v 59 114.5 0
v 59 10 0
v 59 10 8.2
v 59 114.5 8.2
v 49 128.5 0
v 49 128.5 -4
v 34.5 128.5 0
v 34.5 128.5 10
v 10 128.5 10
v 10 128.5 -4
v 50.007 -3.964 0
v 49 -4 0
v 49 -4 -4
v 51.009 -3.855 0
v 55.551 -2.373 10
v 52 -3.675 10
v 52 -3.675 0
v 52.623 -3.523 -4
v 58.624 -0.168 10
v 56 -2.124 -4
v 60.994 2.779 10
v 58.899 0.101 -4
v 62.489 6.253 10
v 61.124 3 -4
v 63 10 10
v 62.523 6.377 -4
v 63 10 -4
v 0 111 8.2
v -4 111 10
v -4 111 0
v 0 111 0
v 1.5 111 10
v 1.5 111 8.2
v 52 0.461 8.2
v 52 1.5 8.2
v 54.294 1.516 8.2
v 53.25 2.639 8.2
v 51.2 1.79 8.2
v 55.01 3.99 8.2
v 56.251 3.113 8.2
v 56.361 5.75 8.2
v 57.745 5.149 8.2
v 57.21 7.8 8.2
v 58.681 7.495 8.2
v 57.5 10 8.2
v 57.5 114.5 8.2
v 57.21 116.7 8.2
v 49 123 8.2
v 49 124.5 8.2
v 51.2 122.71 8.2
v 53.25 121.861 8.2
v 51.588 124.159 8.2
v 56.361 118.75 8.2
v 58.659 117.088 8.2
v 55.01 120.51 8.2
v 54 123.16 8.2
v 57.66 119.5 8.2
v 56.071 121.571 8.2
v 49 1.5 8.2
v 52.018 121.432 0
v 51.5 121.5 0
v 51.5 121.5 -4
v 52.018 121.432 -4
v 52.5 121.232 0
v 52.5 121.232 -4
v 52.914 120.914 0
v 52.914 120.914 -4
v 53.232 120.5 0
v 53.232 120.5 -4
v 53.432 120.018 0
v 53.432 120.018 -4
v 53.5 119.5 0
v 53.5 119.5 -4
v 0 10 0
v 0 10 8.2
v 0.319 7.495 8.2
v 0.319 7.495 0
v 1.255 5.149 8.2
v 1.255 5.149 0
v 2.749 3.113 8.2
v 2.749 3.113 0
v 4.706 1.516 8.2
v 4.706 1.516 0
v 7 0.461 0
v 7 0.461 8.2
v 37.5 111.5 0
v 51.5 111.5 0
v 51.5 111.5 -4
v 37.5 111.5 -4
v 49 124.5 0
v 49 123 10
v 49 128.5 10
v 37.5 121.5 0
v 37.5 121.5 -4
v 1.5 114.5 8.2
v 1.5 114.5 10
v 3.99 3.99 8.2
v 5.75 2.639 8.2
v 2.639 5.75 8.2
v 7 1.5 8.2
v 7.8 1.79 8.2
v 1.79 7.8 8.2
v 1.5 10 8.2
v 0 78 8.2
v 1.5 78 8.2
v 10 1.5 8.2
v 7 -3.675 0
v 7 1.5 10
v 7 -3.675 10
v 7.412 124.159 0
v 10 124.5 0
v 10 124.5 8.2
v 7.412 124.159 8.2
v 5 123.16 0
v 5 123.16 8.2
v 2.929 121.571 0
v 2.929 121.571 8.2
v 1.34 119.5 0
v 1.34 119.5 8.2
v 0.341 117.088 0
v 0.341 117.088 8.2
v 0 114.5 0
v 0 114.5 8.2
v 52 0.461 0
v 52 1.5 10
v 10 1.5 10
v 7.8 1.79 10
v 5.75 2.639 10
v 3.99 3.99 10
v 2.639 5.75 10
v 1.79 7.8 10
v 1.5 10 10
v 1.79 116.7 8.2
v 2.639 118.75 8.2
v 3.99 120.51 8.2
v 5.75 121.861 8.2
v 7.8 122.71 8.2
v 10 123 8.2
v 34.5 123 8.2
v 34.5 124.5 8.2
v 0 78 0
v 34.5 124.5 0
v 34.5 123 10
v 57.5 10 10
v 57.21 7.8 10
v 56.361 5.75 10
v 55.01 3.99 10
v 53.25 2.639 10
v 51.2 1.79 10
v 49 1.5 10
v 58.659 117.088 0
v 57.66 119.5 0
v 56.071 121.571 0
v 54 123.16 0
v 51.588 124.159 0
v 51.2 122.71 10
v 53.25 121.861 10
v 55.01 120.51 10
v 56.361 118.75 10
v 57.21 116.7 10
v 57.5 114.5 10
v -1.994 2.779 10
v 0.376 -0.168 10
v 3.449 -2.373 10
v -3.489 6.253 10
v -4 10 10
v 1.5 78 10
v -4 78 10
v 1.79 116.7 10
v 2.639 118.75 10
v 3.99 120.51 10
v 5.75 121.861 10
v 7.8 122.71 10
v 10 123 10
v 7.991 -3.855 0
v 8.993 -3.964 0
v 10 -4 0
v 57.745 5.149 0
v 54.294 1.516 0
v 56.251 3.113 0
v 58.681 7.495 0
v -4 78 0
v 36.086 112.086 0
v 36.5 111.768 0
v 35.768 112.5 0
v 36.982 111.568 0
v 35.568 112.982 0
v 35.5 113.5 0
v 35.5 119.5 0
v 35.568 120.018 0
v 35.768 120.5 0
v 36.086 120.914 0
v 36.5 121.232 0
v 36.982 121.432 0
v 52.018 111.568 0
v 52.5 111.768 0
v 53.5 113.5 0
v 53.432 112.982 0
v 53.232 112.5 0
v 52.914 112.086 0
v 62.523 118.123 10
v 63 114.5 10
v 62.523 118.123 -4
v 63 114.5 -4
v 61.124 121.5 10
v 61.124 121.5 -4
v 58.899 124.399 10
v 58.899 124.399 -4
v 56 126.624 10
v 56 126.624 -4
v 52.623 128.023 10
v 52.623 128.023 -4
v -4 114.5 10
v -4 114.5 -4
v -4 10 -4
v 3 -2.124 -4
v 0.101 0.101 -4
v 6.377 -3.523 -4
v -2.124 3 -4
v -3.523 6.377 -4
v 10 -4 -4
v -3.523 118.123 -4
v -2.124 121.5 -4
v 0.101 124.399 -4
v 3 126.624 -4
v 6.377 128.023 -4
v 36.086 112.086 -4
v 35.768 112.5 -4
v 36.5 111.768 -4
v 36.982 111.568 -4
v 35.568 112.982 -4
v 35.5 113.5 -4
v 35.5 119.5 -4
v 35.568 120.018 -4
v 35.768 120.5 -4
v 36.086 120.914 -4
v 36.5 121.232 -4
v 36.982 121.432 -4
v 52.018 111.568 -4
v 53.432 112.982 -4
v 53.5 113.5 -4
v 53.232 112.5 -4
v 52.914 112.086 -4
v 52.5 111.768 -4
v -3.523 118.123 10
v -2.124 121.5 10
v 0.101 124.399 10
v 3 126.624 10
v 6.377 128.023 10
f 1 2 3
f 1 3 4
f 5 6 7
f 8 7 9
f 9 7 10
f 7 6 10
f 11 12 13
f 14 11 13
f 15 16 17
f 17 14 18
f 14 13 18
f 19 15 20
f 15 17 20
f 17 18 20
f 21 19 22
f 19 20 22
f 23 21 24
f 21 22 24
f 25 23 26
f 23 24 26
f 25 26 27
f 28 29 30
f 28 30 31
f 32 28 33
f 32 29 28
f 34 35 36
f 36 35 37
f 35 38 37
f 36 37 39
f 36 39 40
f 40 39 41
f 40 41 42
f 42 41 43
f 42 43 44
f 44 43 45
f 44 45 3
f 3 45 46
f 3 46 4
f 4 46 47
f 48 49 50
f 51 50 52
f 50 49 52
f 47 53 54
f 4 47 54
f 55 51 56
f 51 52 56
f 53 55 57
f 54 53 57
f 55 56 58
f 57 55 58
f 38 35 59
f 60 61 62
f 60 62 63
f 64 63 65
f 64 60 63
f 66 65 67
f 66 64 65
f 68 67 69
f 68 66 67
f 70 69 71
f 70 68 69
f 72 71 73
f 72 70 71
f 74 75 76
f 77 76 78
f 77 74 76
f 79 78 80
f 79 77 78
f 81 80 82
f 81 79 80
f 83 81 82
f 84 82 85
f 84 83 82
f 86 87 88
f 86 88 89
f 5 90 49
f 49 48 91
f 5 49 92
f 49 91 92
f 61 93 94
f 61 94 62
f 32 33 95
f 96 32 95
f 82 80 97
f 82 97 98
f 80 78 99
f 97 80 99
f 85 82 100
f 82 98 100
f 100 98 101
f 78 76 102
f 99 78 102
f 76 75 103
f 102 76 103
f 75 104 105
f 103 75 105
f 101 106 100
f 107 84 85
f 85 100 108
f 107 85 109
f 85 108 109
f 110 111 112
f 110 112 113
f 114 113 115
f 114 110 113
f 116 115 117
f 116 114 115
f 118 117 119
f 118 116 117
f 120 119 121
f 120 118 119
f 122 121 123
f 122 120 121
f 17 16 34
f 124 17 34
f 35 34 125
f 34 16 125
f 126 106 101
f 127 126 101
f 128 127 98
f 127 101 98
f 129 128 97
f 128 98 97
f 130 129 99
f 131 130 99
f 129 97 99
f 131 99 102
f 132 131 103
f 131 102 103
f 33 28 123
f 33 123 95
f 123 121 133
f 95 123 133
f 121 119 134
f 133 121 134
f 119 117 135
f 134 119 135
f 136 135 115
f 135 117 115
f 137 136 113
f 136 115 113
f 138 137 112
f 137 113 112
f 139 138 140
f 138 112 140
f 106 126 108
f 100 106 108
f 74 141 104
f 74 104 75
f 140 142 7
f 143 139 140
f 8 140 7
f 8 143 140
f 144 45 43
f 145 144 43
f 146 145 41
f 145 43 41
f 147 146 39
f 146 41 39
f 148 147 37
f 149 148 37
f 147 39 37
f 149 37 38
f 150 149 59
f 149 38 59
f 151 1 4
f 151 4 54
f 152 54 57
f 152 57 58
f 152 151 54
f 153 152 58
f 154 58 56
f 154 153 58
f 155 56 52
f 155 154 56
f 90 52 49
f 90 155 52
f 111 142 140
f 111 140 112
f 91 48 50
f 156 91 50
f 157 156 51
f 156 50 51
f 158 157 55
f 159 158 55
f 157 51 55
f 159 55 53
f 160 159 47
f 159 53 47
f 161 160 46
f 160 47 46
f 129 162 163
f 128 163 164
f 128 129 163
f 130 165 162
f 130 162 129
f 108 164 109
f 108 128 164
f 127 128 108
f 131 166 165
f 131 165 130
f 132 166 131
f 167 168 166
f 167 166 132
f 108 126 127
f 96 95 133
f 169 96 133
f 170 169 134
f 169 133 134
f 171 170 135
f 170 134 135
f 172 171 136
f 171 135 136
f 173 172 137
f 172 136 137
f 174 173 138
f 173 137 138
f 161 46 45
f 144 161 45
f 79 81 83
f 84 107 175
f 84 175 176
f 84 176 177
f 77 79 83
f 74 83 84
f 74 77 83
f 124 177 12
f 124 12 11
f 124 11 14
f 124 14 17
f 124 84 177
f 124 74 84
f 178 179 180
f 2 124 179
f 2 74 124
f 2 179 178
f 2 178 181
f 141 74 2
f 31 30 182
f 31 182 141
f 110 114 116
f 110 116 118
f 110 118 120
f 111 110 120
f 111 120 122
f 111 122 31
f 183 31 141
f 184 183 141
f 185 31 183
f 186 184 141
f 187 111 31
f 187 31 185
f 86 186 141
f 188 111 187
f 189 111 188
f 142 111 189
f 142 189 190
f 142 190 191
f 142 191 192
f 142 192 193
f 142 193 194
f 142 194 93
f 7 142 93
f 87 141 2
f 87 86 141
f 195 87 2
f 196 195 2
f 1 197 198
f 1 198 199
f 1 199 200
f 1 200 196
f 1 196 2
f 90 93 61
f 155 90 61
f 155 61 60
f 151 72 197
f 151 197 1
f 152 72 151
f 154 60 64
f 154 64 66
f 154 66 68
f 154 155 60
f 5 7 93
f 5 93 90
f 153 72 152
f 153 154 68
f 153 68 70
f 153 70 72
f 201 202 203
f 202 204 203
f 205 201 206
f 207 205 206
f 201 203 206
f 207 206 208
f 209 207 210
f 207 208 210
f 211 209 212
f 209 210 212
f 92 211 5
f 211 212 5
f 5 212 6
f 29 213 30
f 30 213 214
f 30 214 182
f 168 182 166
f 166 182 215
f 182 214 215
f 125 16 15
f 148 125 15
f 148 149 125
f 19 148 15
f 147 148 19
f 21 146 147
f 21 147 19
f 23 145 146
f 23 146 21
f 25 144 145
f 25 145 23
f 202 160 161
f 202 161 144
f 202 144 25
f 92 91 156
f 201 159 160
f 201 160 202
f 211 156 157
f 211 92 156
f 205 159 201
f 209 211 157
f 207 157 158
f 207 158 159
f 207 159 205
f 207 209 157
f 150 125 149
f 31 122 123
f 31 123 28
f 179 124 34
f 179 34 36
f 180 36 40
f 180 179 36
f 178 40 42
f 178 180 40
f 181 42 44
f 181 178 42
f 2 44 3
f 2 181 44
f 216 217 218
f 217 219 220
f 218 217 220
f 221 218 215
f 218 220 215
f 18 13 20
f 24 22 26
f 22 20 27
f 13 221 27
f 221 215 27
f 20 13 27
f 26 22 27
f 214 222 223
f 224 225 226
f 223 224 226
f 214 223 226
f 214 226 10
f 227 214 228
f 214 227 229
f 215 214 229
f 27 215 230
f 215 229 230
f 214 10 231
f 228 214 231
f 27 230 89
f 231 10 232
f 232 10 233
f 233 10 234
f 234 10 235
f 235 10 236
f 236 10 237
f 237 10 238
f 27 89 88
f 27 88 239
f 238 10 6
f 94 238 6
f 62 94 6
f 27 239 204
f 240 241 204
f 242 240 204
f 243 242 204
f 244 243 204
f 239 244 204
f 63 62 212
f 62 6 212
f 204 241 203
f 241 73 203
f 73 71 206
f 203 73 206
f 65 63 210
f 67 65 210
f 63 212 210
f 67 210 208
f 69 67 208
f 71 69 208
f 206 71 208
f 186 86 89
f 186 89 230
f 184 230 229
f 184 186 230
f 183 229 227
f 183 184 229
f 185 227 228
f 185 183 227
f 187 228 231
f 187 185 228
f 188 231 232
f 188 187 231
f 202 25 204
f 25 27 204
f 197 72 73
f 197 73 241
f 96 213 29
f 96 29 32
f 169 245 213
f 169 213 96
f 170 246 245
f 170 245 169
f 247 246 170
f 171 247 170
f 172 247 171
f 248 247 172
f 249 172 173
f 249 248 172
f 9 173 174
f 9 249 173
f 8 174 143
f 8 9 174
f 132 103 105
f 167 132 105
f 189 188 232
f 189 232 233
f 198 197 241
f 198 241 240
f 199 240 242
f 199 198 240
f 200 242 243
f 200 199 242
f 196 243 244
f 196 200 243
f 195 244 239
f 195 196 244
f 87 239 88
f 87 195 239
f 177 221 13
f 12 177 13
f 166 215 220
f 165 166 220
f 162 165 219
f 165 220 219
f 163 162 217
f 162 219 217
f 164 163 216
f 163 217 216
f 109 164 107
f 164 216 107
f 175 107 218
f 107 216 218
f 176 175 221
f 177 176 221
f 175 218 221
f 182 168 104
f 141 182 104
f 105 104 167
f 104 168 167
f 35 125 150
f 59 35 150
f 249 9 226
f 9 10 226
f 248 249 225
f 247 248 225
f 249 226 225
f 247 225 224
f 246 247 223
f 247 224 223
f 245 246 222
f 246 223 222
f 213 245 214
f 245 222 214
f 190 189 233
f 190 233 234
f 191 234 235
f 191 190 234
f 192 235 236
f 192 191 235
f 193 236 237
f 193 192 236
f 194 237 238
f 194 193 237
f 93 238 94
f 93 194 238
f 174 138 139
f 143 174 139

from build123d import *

# Parameters (mm, degrees)
F1_DEPTH = 4
F2_DEPTH = 10
F3_DEPTH = 8.2
F4_W     = 5.5
F4_H     = 33
F4_W_2   = 14.5
F4_H_2   = 5.5
F5_DEPTH = 10


with BuildPart() as f1:
    # F0 (on Top) → F1 (new body)
    with BuildSketch(Plane.XY):
        with BuildLine():
            ThreePointArc((49, -4), (58.8994949366, 0.1005050634), (63, 10))
            Line((63, 10), (63, 114.5))
            ThreePointArc((63, 114.5), (58.8994949366, 124.3994949366), (49, 128.5))
            Line((49, 128.5), (10, 128.5))
            ThreePointArc((10, 128.5), (0.1005050634, 124.3994949366), (-4, 114.5))
            Line((-4, 114.5), (-4, 10))
            ThreePointArc((-4, 10), (0.1005050634, 0.1005050634), (10, -4))
            Line((10, -4), (49, -4))
        make_face()
        with BuildLine():
            Line((49, 0), (10, 0))
            ThreePointArc((10, 0), (2.9289321881, 2.9289321881), (0, 10))
            Line((0, 10), (0, 114.5))
            ThreePointArc((0, 114.5), (2.9289321881, 121.5710678119), (10, 124.5))
            Line((10, 124.5), (49, 124.5))
            ThreePointArc((49, 124.5), (56.0710678119, 121.5710678119), (59, 114.5))
            Line((59, 114.5), (59, 10))
            ThreePointArc((59, 10), (56.0710678119, 2.9289321881), (49, 0))
        make_face(mode=Mode.SUBTRACT)
        with BuildLine():
            ThreePointArc((0, 10), (2.9289321881, 2.9289321881), (10, 0))
            Line((10, 0), (49, 0))
            ThreePointArc((49, 0), (56.0710678119, 2.9289321881), (59, 10))
            Line((59, 10), (59, 114.5))
            ThreePointArc((59, 114.5), (56.0710678119, 121.5710678119), (49, 124.5))
            Line((49, 124.5), (10, 124.5))
            ThreePointArc((10, 124.5), (2.9289321881, 121.5710678119), (0, 114.5))
            Line((0, 114.5), (0, 10))
        make_face()
        with BuildLine():
            ThreePointArc((57.5, 10), (55.0104076401, 3.9895923599), (49, 1.5))
            Line((49, 1.5), (10, 1.5))
            ThreePointArc((10, 1.5), (3.9895923599, 3.9895923599), (1.5, 10))
            Line((1.5, 10), (1.5, 114.5))
            ThreePointArc((1.5, 114.5), (3.9895923599, 120.5104076401), (10, 123))
            Line((10, 123), (49, 123))
            ThreePointArc((49, 123), (55.0104076401, 120.5104076401), (57.5, 114.5))
            Line((57.5, 114.5), (57.5, 10))
        make_face(mode=Mode.SUBTRACT)
        with BuildLine():
            Line((10, 1.5), (49, 1.5))
            ThreePointArc((49, 1.5), (55.0104076401, 3.9895923599), (57.5, 10))
            Line((57.5, 10), (57.5, 114.5))
            ThreePointArc((57.5, 114.5), (55.0104076401, 120.5104076401), (49, 123))
            Line((49, 123), (10, 123))
            ThreePointArc((10, 123), (3.9895923599, 120.5104076401), (1.5, 114.5))
            Line((1.5, 114.5), (1.5, 10))
            ThreePointArc((1.5, 10), (3.9895923599, 3.9895923599), (10, 1.5))
        make_face()
        with BuildLine():
            Line((37.5, 121.5), (51.5, 121.5))
            ThreePointArc((51.5, 121.5), (52.9142135624, 120.9142135624), (53.5, 119.5))
            Line((53.5, 119.5), (53.5, 113.5))
            ThreePointArc((53.5, 113.5), (52.9142135624, 112.0857864376), (51.5, 111.5))
            Line((51.5, 111.5), (37.5, 111.5))
            ThreePointArc((37.5, 111.5), (36.0857864376, 112.0857864376), (35.5, 113.5))
            Line((35.5, 113.5), (35.5, 119.5))
            ThreePointArc((35.5, 119.5), (36.0857864376, 120.9142135624), (37.5, 121.5))
        make_face(mode=Mode.SUBTRACT)
    extrude(amount=-F1_DEPTH)

    # F0 (on Top) → F2 (join)
    with BuildSketch(Plane.XY):
        with BuildLine():
            ThreePointArc((49, -4), (58.8994949366, 0.1005050634), (63, 10))
            Line((63, 10), (63, 114.5))
            ThreePointArc((63, 114.5), (58.8994949366, 124.3994949366), (49, 128.5))
            Line((49, 128.5), (10, 128.5))
            ThreePointArc((10, 128.5), (0.1005050634, 124.3994949366), (-4, 114.5))
            Line((-4, 114.5), (-4, 10))
            ThreePointArc((-4, 10), (0.1005050634, 0.1005050634), (10, -4))
            Line((10, -4), (49, -4))
        make_face()
        with BuildLine():
            Line((49, 0), (10, 0))
            ThreePointArc((10, 0), (2.9289321881, 2.9289321881), (0, 10))
            Line((0, 10), (0, 114.5))
            ThreePointArc((0, 114.5), (2.9289321881, 121.5710678119), (10, 124.5))
            Line((10, 124.5), (49, 124.5))
            ThreePointArc((49, 124.5), (56.0710678119, 121.5710678119), (59, 114.5))
            Line((59, 114.5), (59, 10))
            ThreePointArc((59, 10), (56.0710678119, 2.9289321881), (49, 0))
        make_face(mode=Mode.SUBTRACT)
        with BuildLine():
            ThreePointArc((0, 10), (2.9289321881, 2.9289321881), (10, 0))
            Line((10, 0), (49, 0))
            ThreePointArc((49, 0), (56.0710678119, 2.9289321881), (59, 10))
            Line((59, 10), (59, 114.5))
            ThreePointArc((59, 114.5), (56.0710678119, 121.5710678119), (49, 124.5))
            Line((49, 124.5), (10, 124.5))
            ThreePointArc((10, 124.5), (2.9289321881, 121.5710678119), (0, 114.5))
            Line((0, 114.5), (0, 10))
        make_face()
        with BuildLine():
            ThreePointArc((57.5, 10), (55.0104076401, 3.9895923599), (49, 1.5))
            Line((49, 1.5), (10, 1.5))
            ThreePointArc((10, 1.5), (3.9895923599, 3.9895923599), (1.5, 10))
            Line((1.5, 10), (1.5, 114.5))
            ThreePointArc((1.5, 114.5), (3.9895923599, 120.5104076401), (10, 123))
            Line((10, 123), (49, 123))
            ThreePointArc((49, 123), (55.0104076401, 120.5104076401), (57.5, 114.5))
            Line((57.5, 114.5), (57.5, 10))
        make_face(mode=Mode.SUBTRACT)
    extrude(amount=F2_DEPTH)

    # F0 (on Top) → F3 (cut)
    with BuildSketch(Plane.XY):
        with BuildLine():
            ThreePointArc((0, 10), (2.9289321881, 2.9289321881), (10, 0))
            Line((10, 0), (49, 0))
            ThreePointArc((49, 0), (56.0710678119, 2.9289321881), (59, 10))
            Line((59, 10), (59, 114.5))
            ThreePointArc((59, 114.5), (56.0710678119, 121.5710678119), (49, 124.5))
            Line((49, 124.5), (10, 124.5))
            ThreePointArc((10, 124.5), (2.9289321881, 121.5710678119), (0, 114.5))
            Line((0, 114.5), (0, 10))
        make_face()
        with BuildLine():
            ThreePointArc((57.5, 10), (55.0104076401, 3.9895923599), (49, 1.5))
            Line((49, 1.5), (10, 1.5))
            ThreePointArc((10, 1.5), (3.9895923599, 3.9895923599), (1.5, 10))
            Line((1.5, 10), (1.5, 114.5))
            ThreePointArc((1.5, 114.5), (3.9895923599, 120.5104076401), (10, 123))
            Line((10, 123), (49, 123))
            ThreePointArc((49, 123), (55.0104076401, 120.5104076401), (57.5, 114.5))
            Line((57.5, 114.5), (57.5, 10))
        make_face(mode=Mode.SUBTRACT)
    extrude(amount=F3_DEPTH, mode=Mode.SUBTRACT)

    # F4 (on face) → F5 (cut)
    with BuildSketch(Plane.XY.offset(10)):
        with Locations((-1.25, 94.5)):
            Rectangle(F4_W, F4_H)
        with Locations((41.75, 125.75)):
            Rectangle(F4_W_2, F4_H_2)
        with BuildLine():
            Line((7, 1.5), (7, -3.6747943312))
            ThreePointArc((7, -3.6747943312), (8.4912125127, -3.9184611333), (10, -4))
            Line((10, -4), (49, -4))
            ThreePointArc((49, -4), (50.5087874873, -3.9184611333), (52, -3.6747943312))
            Line((52, -3.6747943312), (52, 1.5))
            Line((52, 1.5), (49, 1.5))
            Line((49, 1.5), (10, 1.5))
            Line((10, 1.5), (7, 1.5))
        make_face()
    extrude(amount=-F5_DEPTH, mode=Mode.SUBTRACT)


solid = f1.part
